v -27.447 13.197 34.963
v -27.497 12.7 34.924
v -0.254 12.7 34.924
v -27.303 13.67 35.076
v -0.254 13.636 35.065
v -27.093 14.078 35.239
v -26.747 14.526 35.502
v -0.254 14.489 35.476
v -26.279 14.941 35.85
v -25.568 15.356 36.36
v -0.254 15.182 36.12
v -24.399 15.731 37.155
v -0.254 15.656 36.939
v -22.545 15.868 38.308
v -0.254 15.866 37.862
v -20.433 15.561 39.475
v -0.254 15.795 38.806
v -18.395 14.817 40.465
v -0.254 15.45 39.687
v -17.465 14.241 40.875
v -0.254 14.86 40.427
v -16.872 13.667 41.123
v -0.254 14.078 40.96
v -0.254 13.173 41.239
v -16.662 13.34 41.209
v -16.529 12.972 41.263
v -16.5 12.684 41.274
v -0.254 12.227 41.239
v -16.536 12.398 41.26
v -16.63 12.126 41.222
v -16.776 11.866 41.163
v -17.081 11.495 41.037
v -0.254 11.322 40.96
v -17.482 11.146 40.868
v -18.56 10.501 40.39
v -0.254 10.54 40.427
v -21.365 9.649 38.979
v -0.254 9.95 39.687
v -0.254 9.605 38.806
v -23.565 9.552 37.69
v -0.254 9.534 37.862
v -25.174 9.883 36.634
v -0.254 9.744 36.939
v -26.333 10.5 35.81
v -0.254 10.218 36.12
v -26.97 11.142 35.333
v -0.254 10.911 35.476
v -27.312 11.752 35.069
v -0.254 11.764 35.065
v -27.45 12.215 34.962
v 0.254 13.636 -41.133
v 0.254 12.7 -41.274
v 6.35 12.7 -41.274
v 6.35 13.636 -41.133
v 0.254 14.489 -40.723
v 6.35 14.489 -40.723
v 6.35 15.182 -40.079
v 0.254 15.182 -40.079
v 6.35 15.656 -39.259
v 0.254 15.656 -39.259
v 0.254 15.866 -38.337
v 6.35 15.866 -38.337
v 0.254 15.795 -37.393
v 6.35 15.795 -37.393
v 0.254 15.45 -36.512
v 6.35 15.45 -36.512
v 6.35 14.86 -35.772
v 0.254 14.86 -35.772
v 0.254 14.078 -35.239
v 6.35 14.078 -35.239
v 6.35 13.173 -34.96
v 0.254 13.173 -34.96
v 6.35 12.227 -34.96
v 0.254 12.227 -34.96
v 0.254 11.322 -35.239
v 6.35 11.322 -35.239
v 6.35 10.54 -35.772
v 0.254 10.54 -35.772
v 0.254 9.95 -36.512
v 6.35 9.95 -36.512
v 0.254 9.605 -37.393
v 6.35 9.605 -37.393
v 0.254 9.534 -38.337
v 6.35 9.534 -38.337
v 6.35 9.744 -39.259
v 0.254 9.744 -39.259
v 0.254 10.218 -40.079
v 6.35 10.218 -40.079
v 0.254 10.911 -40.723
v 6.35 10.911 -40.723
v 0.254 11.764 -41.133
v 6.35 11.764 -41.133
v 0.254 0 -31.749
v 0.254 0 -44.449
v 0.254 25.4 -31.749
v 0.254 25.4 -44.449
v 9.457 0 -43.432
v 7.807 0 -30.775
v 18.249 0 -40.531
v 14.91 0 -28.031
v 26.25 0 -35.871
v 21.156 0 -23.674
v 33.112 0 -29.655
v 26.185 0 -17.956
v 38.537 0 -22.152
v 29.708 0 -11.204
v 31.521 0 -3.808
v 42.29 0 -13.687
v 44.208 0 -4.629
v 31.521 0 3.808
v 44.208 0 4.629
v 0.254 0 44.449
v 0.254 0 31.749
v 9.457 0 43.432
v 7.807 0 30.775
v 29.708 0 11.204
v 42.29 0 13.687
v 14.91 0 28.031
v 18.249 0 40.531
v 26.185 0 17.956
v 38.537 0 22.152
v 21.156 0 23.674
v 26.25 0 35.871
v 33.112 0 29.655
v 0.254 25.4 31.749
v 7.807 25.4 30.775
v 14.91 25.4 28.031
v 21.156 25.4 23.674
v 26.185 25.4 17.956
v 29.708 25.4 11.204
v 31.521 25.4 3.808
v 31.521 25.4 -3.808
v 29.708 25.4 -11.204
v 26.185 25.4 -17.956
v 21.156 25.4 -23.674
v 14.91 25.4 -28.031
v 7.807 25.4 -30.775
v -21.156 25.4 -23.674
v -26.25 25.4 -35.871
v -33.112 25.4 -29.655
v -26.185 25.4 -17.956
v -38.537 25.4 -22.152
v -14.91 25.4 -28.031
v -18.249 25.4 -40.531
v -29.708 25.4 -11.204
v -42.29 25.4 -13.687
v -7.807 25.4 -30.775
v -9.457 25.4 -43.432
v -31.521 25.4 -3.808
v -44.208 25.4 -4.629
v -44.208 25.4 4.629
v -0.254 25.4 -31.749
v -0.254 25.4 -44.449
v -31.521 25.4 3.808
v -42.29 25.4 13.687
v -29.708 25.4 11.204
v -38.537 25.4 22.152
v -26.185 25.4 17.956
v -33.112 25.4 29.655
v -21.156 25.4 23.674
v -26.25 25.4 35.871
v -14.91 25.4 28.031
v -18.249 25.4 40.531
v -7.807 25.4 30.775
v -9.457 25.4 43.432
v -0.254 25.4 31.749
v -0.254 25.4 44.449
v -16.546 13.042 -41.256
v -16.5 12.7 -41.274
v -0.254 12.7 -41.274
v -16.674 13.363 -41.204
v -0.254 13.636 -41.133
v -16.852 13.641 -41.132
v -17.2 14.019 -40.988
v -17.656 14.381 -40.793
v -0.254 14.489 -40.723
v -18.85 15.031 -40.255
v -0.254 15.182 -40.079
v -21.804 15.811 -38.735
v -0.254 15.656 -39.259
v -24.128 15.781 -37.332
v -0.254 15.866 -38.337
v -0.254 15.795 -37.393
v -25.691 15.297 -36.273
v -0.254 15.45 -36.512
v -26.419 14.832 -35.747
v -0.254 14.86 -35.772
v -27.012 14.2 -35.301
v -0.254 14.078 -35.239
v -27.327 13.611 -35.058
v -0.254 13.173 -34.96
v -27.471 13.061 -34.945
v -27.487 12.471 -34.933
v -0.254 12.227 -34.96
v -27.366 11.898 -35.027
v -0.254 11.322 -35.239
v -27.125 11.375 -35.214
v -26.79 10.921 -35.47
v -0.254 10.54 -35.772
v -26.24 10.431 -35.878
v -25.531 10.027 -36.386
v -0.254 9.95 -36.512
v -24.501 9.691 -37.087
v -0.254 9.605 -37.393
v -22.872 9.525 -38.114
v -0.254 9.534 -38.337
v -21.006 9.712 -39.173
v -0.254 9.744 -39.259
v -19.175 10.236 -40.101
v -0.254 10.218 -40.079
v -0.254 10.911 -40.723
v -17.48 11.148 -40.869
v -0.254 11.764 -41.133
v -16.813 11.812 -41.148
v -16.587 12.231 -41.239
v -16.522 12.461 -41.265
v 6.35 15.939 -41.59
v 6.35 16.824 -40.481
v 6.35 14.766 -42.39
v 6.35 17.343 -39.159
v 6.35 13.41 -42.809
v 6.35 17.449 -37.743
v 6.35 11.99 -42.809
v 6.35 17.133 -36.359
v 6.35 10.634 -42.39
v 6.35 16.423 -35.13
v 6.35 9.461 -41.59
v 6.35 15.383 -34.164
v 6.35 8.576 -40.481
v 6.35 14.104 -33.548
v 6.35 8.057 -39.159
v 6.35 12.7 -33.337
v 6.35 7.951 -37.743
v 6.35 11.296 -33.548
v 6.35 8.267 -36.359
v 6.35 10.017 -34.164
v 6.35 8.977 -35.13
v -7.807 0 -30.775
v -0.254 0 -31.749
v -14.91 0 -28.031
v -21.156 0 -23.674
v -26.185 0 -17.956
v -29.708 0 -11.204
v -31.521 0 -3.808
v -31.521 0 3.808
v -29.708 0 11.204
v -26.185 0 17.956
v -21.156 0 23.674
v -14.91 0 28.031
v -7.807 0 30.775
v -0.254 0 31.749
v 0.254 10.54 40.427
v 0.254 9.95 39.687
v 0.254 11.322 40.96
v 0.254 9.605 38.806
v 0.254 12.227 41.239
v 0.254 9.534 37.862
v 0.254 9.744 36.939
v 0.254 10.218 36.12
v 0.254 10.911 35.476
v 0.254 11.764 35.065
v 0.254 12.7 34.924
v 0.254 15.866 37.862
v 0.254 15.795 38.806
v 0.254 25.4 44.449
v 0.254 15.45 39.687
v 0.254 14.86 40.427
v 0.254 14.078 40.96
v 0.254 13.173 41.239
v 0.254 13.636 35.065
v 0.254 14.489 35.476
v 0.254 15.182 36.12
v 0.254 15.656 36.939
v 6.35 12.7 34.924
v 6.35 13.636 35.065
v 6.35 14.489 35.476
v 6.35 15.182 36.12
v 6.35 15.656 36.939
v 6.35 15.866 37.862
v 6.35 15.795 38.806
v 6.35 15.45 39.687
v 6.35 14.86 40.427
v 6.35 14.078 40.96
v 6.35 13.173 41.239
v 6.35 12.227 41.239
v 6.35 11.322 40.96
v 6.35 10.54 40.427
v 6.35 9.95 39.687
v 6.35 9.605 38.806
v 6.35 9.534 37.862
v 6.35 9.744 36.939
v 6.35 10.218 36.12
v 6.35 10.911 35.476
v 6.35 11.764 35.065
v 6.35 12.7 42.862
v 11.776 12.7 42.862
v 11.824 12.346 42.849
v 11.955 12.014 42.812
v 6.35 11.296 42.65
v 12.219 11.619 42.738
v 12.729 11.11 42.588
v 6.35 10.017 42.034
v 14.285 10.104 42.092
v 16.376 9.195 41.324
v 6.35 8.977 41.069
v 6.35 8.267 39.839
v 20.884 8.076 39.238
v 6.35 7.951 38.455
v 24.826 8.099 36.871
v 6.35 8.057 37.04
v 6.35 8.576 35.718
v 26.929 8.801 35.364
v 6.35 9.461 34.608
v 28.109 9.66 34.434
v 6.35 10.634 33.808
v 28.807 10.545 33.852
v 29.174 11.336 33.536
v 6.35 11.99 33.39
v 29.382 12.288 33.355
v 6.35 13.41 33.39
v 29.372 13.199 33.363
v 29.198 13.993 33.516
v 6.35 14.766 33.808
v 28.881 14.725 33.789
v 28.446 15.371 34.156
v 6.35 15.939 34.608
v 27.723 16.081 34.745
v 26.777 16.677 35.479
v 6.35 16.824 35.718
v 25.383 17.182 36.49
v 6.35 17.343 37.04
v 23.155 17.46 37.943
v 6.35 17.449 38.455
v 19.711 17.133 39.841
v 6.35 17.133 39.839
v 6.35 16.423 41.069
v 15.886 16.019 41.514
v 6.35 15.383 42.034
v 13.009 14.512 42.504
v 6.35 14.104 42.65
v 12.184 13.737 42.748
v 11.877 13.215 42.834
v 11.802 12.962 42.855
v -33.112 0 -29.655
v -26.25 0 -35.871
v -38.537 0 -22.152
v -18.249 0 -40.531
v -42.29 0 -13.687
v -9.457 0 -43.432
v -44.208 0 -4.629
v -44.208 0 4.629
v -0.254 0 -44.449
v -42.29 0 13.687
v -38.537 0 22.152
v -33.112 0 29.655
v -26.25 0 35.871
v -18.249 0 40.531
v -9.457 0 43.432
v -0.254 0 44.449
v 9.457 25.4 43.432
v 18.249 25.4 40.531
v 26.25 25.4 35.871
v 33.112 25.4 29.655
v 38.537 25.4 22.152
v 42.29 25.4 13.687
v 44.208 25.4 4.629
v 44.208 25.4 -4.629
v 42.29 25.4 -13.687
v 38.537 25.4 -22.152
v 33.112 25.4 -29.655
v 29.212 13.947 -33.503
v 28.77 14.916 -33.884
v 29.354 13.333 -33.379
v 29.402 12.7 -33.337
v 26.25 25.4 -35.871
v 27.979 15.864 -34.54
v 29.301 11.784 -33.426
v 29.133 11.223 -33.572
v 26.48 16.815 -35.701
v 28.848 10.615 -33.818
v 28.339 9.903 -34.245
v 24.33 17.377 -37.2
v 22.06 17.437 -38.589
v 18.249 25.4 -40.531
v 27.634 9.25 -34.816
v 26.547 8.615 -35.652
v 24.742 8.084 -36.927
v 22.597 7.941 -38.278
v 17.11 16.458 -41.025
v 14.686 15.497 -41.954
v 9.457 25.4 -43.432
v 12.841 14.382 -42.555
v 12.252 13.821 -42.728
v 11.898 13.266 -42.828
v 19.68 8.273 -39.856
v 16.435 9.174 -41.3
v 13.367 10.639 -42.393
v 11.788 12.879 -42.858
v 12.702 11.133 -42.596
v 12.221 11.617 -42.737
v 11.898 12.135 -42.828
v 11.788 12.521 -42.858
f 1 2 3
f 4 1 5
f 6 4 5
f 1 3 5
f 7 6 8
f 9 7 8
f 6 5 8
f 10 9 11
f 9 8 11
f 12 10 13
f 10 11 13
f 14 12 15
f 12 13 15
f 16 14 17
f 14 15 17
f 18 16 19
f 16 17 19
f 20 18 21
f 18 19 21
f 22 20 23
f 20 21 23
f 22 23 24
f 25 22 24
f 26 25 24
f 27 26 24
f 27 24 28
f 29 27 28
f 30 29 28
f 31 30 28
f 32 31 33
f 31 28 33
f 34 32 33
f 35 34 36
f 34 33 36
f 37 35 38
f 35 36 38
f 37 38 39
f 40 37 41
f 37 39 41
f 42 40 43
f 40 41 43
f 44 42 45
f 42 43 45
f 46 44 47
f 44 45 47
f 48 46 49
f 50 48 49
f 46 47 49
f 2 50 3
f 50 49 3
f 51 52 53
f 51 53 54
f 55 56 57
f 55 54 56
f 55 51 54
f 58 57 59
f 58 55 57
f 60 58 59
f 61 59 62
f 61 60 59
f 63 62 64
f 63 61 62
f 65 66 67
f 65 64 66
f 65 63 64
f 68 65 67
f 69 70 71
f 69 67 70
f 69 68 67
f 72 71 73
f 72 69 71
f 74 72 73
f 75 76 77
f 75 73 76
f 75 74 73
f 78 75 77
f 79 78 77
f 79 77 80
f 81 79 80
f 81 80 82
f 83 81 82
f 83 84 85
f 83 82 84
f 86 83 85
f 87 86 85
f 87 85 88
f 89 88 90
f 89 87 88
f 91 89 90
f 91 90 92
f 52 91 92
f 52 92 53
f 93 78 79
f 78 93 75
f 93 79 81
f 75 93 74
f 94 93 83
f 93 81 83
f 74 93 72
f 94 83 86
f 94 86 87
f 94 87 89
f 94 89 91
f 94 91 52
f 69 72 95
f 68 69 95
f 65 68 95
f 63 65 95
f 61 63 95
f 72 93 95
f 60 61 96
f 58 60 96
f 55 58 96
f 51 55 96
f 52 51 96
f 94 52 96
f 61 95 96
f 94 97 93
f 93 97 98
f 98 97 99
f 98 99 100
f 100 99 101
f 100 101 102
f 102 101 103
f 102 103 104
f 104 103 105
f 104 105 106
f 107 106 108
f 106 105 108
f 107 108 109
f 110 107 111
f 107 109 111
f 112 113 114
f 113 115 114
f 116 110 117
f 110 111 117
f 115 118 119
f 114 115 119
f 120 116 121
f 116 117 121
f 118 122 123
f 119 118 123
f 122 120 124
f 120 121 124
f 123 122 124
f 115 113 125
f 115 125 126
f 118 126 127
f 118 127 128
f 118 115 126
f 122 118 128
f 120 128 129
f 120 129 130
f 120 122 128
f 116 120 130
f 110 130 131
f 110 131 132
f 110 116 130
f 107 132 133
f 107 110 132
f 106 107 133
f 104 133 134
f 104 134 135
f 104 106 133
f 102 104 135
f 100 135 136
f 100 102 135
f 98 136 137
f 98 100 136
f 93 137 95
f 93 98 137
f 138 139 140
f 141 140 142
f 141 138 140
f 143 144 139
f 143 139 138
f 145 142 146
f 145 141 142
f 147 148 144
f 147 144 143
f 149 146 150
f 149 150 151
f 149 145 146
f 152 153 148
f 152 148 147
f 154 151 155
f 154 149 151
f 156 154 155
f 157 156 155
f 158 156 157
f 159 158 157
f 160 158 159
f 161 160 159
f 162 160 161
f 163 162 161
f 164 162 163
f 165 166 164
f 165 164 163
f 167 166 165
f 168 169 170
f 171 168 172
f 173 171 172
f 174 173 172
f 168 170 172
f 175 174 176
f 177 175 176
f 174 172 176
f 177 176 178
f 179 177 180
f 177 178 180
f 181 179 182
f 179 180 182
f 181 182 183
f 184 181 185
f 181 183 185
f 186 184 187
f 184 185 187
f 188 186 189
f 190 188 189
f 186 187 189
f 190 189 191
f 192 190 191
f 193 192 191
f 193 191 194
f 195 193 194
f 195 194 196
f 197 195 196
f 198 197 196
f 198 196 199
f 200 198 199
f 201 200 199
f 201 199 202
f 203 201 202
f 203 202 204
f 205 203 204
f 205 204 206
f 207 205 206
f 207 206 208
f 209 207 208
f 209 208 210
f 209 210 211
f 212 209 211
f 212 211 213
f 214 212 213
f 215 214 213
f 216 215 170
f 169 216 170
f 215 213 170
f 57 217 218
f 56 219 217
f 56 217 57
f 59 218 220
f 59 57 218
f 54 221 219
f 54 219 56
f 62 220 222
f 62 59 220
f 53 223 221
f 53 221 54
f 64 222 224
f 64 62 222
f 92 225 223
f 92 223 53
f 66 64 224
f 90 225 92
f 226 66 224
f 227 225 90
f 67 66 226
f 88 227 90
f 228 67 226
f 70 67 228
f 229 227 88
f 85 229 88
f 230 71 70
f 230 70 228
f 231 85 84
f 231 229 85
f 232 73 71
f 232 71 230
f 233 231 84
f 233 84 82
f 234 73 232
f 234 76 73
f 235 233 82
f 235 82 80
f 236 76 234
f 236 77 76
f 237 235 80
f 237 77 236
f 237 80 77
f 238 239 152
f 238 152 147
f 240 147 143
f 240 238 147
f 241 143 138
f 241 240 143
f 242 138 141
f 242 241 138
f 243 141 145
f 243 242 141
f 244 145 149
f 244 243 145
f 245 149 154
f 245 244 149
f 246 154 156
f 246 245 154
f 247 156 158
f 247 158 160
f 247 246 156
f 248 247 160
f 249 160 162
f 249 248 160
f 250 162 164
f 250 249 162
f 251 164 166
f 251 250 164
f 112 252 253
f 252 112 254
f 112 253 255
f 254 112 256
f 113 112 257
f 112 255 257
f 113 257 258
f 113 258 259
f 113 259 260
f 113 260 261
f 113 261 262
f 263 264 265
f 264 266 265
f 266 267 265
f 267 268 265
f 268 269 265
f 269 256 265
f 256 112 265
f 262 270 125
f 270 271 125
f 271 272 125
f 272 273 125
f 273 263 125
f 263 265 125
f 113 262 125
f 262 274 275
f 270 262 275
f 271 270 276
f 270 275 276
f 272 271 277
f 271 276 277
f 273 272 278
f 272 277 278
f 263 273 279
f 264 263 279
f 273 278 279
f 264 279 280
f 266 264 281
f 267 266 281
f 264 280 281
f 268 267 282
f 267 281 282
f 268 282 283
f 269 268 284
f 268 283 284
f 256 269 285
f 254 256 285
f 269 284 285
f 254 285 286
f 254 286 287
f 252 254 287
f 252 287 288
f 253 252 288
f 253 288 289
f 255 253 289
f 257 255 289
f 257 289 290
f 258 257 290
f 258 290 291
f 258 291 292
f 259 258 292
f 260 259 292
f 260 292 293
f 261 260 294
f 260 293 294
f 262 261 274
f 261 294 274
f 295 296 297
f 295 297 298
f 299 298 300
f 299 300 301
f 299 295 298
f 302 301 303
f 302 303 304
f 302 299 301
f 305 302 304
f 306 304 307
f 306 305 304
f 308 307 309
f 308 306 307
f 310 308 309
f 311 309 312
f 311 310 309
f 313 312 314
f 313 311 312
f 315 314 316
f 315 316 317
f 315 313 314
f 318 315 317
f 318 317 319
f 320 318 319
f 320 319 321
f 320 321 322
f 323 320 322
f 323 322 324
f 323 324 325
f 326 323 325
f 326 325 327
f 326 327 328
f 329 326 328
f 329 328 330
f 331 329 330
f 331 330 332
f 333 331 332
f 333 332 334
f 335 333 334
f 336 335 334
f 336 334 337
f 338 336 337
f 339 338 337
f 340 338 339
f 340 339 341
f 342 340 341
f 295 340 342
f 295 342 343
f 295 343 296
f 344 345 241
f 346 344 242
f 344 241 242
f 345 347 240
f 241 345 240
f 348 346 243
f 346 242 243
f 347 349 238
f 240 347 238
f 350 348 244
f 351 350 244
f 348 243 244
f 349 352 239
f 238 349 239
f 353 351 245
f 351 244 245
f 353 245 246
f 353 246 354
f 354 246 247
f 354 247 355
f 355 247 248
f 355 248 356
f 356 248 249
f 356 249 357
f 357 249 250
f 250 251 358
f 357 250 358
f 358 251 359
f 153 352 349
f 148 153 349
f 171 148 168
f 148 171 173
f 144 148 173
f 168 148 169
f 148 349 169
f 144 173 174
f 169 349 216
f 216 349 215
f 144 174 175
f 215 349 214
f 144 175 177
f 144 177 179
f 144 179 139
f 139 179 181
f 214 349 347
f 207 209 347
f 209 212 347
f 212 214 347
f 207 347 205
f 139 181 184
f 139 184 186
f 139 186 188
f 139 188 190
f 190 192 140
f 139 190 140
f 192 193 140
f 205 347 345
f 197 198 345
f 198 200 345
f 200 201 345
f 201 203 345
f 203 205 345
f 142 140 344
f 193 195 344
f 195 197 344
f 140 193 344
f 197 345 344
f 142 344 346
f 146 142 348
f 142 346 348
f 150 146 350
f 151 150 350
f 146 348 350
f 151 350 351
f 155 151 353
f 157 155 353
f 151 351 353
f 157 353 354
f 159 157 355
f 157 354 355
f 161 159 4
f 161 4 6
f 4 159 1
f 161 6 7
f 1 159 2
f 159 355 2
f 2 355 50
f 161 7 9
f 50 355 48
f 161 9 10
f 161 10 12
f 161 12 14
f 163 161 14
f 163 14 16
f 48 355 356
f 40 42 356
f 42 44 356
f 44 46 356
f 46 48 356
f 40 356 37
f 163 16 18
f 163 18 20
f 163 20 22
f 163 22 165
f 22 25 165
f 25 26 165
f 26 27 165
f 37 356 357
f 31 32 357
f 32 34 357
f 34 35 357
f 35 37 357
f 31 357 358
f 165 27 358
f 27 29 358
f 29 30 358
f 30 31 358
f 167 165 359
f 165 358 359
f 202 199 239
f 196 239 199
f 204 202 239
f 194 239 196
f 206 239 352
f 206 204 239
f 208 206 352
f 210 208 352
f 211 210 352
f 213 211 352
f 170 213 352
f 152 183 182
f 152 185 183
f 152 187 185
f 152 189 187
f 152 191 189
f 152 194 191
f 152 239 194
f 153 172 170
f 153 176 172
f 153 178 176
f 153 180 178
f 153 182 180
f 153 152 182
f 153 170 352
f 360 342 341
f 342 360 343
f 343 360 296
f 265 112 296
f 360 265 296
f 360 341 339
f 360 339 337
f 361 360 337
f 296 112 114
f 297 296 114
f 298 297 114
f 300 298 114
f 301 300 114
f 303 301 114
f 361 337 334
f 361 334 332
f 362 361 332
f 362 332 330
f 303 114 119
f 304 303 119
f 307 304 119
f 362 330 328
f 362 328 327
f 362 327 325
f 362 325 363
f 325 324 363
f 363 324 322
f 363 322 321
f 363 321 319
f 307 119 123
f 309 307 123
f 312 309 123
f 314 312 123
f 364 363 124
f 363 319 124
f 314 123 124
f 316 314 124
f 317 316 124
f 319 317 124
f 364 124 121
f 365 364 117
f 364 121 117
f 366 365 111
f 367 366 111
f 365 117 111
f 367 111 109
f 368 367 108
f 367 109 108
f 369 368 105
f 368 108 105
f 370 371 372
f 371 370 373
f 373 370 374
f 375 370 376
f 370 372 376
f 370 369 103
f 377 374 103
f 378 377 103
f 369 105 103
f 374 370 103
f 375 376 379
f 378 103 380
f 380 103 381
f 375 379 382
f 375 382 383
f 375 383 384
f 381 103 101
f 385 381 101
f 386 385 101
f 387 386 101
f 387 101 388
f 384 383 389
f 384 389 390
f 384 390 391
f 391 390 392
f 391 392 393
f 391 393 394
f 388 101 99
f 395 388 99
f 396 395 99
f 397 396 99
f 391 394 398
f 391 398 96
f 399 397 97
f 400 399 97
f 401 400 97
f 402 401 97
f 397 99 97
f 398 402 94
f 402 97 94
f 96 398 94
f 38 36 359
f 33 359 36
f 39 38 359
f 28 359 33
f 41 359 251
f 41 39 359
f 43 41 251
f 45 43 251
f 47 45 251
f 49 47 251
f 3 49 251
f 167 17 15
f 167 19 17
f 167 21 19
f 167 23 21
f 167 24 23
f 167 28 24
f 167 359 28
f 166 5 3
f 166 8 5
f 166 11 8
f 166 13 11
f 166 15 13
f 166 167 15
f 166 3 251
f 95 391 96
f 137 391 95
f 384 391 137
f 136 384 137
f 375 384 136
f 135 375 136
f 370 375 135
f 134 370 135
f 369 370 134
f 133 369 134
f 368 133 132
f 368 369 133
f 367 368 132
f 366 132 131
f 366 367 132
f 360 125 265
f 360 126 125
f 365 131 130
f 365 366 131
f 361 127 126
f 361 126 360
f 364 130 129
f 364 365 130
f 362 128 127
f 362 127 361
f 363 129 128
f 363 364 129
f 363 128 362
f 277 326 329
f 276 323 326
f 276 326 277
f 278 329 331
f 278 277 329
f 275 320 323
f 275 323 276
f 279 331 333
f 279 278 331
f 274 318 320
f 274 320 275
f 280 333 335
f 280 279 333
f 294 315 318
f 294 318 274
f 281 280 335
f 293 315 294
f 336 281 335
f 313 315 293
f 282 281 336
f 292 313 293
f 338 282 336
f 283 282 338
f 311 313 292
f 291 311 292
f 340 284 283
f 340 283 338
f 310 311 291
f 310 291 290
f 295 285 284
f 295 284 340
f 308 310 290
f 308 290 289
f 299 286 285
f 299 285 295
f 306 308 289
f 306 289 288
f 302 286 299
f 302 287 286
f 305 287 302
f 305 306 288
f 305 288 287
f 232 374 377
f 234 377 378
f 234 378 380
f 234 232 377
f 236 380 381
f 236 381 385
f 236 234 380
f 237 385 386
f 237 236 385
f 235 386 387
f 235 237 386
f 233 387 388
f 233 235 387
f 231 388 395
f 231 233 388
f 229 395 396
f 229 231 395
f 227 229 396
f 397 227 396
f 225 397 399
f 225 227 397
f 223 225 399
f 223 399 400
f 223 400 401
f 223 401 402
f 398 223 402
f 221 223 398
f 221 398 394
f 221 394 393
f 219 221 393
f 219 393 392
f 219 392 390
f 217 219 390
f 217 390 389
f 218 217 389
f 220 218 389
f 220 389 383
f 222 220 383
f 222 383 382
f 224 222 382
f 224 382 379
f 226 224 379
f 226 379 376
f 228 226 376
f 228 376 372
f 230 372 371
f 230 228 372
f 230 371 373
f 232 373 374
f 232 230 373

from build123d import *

# Parameters (mm, degrees)
SKETCH1_R           = 44.45
SKETCH1_R_2         = 31.75
BOSS_EXTRUDE1_DEPTH = 25.4
SKETCH2_W           = 0.508
SKETCH2_H           = 94.561041641
CUT_EXTRUDE1_DEPTH  = 25.4
SKETCH3_R           = 3.175
CUT_EXTRUDE2_DEPTH  = 29.21
CUT_EXTRUDE3_START  = 6.35
SKETCH4_R           = 4.7625
CUT_EXTRUDE3_DEPTH  = 77.47


with BuildPart() as part:
    # Sketch1 → Boss-Extrude1 (new body)
    with BuildSketch(Plane(origin=(0, 0, 0), x_dir=(1, 0, 0), z_dir=(0, 1, 0))):
        with Locations(Location((0, 0, 0), (0, 0, 270))):
            Circle(SKETCH1_R)
        with Locations(Location((0, 0, 0), (0, 0, 270))):
            Circle(SKETCH1_R_2, mode=Mode.SUBTRACT)
    extrude(amount=BOSS_EXTRUDE1_DEPTH)

    # Sketch2 → Cut-Extrude1 (cut)
    with BuildSketch(Plane(origin=(0, 25.4, 0), x_dir=(1, 0, 0), z_dir=(0, 1, 0))):
        with Locations((0, -0.808982296)):
            Rectangle(SKETCH2_W, SKETCH2_H)
    extrude(amount=-CUT_EXTRUDE1_DEPTH, mode=Mode.SUBTRACT)


with BuildPart() as cut_extrude1_piece_1:
    # of the separate pieces the step leaves, piece 1, a body of its own (cut_extrude1_pieces)
    add(part.part.solids().sort_by_distance((-0.254, 0, -44.44927428))[0])


with BuildPart() as cut_extrude1_piece_2:
    # of the separate pieces the step leaves, piece 2, a body of its own (cut_extrude1_pieces)
    add(part.part.solids().sort_by_distance((0.254, 0, 44.44927428))[0])


with BuildPart() as cut_extrude2_tool:
    # Sketch3 → Cut-Extrude2 (new, symmetric)
    with BuildSketch(Plane(origin=(-0.254, 0, 0), x_dir=(0, 0, -1), z_dir=(1, 0, 0))):
        with Locations((38.09927428, 12.7)):
            Circle(SKETCH3_R)
        with Locations((-38.09927428, 12.7)):
            Circle(SKETCH3_R)
    extrude(amount=CUT_EXTRUDE2_DEPTH, both=True)


with BuildPart() as cut_extrude1_piece_1_1:
    add(cut_extrude1_piece_1.part)

    # Cut-Extrude2: cut by cut_extrude2_tool
    add(cut_extrude2_tool.part, mode=Mode.SUBTRACT)


with BuildPart() as cut_extrude1_piece_2_1:
    add(cut_extrude1_piece_2.part)

    # Cut-Extrude2: cut by cut_extrude2_tool
    add(cut_extrude2_tool.part, mode=Mode.SUBTRACT)

    # Sketch4 → Cut-Extrude3 (cut)
    with BuildSketch(Plane(origin=(0, 0, 0), x_dir=(0, 0, -1), z_dir=(1, 0, 0)).offset(CUT_EXTRUDE3_START)):
        with Locations(Location((38.09927428, 12.7, 0), (0, 0, 180))):
            Circle(SKETCH4_R)
        with Locations(Location((-38.09927428, 12.7, 0), (0, 0, 180))):
            Circle(SKETCH4_R)
    extrude(amount=CUT_EXTRUDE3_DEPTH, mode=Mode.SUBTRACT)


solid = Compound([cut_extrude1_piece_1_1.part, cut_extrude1_piece_2_1.part])
